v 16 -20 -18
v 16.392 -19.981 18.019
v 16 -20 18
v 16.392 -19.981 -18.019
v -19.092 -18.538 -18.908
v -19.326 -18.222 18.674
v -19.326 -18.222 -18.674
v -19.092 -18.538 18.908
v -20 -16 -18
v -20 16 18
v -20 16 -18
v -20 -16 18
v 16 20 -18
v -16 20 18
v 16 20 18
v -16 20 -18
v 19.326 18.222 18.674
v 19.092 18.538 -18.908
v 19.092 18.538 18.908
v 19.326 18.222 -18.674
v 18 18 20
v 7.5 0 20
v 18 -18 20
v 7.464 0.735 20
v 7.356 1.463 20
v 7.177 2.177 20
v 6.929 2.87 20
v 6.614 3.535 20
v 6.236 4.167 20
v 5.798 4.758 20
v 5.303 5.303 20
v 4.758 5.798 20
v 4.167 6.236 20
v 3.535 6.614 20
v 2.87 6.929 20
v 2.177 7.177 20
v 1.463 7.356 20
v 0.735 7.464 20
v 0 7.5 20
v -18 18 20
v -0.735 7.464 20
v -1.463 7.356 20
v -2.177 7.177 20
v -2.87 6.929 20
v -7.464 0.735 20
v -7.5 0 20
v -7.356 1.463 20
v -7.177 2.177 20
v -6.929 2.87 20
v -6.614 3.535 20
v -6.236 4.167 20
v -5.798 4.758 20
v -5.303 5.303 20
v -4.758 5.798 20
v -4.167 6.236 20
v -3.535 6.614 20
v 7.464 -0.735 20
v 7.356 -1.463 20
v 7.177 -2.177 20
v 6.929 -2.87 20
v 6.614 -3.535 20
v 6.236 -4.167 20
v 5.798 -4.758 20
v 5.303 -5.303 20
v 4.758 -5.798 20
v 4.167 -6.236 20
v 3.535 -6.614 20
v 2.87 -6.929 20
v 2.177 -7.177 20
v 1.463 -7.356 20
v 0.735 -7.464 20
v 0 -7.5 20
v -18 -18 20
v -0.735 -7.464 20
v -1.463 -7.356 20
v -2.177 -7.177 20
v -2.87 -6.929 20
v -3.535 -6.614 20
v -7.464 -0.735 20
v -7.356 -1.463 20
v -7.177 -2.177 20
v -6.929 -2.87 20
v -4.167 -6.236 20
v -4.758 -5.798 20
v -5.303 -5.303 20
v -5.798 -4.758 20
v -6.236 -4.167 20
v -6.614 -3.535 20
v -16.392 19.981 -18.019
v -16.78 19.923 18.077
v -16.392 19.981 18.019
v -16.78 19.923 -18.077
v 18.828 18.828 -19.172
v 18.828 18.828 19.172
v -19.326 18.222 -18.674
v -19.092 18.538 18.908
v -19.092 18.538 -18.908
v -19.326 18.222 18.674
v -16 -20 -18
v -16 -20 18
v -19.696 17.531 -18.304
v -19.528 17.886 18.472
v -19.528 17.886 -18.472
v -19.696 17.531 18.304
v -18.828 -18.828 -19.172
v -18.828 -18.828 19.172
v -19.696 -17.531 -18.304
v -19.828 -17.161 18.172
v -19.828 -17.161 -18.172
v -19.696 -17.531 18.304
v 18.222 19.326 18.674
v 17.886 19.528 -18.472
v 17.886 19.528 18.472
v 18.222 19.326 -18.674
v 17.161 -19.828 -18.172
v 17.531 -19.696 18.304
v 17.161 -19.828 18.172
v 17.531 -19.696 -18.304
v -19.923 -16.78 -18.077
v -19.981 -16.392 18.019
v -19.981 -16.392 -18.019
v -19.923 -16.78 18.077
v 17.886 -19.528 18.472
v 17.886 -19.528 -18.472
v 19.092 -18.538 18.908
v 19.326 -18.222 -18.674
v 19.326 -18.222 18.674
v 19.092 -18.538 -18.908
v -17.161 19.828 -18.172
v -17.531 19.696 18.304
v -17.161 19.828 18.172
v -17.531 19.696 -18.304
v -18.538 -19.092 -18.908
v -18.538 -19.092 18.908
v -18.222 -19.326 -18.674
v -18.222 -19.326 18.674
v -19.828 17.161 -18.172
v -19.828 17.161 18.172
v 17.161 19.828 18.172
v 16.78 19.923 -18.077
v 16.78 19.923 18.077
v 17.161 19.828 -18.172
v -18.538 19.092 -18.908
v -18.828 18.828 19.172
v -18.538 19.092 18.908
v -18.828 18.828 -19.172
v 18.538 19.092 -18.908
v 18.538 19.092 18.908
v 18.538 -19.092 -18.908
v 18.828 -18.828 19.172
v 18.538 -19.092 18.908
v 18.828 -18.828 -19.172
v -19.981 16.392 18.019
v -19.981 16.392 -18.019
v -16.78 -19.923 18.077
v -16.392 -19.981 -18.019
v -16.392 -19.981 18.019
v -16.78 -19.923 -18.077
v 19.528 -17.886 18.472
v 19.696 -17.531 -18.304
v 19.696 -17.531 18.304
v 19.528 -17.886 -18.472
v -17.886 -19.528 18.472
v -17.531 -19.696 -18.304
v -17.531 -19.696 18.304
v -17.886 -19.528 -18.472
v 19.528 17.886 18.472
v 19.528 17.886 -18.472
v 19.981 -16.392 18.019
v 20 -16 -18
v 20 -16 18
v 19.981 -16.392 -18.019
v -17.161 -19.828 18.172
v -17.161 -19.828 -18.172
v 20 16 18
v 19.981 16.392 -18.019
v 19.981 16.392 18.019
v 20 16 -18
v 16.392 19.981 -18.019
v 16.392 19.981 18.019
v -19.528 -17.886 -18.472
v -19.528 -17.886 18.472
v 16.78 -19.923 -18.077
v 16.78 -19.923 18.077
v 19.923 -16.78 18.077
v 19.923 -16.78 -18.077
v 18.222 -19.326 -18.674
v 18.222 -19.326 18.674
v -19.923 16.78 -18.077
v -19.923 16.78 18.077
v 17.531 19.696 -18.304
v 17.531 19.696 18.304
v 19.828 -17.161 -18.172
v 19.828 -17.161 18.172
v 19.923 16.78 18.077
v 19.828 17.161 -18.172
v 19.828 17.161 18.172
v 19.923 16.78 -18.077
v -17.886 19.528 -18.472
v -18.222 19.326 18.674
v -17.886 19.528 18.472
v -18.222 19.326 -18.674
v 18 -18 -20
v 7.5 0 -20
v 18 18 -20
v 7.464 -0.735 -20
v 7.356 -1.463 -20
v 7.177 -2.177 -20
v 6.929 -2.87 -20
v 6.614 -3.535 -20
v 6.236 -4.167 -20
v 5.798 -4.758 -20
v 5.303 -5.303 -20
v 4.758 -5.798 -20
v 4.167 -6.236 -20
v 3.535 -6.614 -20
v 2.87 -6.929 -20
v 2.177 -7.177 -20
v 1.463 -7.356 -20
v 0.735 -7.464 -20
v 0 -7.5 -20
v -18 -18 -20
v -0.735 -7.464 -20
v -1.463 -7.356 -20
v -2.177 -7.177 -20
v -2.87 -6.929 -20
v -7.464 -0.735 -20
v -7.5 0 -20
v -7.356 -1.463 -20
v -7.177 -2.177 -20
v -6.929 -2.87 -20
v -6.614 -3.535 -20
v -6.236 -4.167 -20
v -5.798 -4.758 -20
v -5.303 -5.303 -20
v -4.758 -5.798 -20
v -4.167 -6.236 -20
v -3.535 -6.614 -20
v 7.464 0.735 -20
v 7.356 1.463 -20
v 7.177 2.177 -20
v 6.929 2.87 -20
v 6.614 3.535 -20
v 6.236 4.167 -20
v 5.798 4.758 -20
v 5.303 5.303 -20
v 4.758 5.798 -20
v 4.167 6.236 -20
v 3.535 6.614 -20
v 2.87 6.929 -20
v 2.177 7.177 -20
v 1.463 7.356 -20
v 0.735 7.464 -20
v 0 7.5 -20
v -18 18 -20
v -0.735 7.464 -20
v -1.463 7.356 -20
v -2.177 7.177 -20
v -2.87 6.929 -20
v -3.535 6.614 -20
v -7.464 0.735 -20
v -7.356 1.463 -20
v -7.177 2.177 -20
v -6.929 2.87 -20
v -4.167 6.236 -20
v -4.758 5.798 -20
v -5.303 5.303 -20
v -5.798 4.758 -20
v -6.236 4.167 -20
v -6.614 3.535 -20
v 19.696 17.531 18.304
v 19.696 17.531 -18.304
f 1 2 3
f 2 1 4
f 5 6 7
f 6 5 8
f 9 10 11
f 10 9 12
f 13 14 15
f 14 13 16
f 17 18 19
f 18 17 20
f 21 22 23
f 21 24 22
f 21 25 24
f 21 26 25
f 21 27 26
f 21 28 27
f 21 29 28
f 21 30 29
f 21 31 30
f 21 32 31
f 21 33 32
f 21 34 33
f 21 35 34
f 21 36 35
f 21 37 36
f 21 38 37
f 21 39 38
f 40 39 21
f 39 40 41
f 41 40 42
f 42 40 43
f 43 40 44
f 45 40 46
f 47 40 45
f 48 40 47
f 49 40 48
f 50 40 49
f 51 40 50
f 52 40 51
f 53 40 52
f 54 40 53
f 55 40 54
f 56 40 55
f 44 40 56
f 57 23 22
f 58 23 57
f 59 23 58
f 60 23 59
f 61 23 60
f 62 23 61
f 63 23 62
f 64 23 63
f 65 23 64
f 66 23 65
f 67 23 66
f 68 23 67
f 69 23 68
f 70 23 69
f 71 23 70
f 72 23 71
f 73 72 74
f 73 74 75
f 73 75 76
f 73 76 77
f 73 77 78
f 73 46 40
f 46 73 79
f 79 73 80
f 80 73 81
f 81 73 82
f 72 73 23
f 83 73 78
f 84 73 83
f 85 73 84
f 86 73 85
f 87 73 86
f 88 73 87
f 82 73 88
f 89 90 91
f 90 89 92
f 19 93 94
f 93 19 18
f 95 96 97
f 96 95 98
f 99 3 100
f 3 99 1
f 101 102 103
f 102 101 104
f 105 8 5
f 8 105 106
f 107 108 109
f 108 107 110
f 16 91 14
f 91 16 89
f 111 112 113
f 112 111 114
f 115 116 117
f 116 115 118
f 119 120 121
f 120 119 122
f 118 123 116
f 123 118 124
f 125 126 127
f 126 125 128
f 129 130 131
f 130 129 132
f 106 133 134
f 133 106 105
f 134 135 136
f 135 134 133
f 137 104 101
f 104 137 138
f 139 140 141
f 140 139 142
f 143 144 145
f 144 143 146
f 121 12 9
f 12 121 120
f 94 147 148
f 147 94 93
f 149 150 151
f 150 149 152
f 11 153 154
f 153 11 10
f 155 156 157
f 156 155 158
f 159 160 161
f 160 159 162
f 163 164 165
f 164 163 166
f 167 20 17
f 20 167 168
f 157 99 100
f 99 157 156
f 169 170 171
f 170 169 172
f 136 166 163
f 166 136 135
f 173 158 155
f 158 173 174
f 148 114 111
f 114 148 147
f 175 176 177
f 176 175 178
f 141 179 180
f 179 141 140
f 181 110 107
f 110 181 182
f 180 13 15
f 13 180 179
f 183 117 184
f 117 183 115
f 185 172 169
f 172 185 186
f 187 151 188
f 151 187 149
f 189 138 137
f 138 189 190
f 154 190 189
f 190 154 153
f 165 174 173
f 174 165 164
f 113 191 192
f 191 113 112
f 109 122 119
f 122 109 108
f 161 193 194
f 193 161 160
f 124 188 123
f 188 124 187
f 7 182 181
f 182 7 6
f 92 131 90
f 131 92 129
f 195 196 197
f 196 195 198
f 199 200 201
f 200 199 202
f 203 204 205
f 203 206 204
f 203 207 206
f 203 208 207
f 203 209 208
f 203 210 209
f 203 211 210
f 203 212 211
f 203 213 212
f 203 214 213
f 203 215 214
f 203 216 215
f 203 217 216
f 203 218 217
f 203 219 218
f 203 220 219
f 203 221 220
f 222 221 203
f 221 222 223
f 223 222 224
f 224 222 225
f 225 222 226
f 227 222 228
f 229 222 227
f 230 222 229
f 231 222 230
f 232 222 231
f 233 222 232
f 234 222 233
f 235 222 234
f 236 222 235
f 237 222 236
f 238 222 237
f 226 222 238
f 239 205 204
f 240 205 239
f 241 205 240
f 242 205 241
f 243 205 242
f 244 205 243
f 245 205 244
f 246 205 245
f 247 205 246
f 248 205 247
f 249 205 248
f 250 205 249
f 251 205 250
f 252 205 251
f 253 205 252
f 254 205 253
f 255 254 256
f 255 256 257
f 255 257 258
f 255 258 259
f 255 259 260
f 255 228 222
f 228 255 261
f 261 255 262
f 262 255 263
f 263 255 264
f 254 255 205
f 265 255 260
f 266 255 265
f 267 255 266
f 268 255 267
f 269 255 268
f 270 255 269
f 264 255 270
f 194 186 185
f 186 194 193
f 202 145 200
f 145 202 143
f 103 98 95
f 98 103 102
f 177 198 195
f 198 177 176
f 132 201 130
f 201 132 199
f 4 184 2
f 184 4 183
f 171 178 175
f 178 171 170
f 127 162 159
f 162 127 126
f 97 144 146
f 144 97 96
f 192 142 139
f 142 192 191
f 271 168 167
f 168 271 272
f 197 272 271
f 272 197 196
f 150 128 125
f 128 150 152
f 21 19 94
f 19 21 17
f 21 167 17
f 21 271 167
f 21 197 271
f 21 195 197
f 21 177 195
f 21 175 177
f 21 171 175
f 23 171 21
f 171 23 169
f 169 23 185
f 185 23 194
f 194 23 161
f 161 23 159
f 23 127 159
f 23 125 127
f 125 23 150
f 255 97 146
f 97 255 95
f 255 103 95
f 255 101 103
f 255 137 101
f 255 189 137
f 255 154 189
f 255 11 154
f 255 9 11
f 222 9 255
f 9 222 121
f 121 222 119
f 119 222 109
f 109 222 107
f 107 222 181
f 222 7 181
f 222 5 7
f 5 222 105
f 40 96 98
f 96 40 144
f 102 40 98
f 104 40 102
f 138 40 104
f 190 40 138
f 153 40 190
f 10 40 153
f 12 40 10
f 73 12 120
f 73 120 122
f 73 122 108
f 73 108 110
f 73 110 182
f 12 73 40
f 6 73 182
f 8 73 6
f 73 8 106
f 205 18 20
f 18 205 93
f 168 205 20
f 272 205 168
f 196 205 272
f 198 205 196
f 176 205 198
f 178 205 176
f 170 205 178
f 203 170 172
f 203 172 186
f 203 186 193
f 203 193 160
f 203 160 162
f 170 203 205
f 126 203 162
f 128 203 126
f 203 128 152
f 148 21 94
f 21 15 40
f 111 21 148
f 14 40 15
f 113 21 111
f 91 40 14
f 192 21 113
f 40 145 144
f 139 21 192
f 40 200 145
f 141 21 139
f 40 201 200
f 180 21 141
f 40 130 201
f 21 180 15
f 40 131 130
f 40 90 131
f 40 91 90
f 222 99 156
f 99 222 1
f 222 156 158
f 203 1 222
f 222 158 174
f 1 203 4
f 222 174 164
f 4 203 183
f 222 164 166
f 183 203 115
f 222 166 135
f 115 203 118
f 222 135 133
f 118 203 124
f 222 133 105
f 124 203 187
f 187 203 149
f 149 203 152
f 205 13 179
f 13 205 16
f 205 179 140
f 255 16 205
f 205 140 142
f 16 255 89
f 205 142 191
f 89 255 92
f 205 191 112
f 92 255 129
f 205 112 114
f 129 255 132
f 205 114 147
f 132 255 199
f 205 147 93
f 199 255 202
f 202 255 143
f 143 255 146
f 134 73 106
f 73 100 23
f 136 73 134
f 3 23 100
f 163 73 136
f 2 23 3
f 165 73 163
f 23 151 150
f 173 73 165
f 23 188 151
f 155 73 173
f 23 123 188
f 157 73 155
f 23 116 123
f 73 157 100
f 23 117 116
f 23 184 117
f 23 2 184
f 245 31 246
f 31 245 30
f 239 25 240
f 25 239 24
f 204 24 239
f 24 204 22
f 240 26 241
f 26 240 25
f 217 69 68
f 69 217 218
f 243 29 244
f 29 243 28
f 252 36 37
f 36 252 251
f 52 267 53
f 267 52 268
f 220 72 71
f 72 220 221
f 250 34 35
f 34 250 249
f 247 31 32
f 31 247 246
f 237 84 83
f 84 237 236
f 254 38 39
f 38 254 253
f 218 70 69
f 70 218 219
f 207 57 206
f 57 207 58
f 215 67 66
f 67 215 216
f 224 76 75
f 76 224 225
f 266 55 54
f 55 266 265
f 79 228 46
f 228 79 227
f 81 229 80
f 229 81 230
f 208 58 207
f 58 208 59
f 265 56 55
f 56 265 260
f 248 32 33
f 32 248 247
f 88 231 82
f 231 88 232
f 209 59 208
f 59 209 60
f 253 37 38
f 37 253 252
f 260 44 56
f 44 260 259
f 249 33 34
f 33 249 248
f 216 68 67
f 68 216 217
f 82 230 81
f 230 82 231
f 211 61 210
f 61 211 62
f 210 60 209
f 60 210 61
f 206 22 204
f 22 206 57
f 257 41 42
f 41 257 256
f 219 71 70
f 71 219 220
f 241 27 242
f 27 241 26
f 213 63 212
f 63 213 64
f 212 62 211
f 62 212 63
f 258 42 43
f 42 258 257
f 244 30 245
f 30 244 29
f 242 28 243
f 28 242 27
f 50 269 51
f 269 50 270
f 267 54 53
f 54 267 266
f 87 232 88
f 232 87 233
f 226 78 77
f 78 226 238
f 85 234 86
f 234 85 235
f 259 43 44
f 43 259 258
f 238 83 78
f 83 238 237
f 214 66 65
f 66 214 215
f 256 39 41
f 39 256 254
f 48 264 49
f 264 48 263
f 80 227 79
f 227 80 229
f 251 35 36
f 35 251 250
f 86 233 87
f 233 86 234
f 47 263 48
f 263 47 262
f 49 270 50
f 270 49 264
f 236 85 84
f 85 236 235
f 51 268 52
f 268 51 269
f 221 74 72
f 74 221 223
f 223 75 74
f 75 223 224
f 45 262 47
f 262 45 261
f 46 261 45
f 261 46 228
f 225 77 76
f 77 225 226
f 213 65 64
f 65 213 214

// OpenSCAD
/* =================================================================
   test_cube.scad  —  simple test model for render skill validation
   =================================================================
   Units : mm
   Coords: X = width, Y = depth/height, Z = print direction
   ================================================================= */

// ── Parameters ────────────────────────────────────────────────────
size       = 40;    // outer cube side length (mm)
hole_d     = 15;    // through-hole diameter (mm)
fillet_r   = 4;     // corner rounding radius (mm)
chamfer_s  = 2;     // top/bottom chamfer size (mm)

// ── Resolution ────────────────────────────────────────────────────
$fn = 64;

// ── Derived values ────────────────────────────────────────────────
hole_r = hole_d / 2;

// ── Modules ───────────────────────────────────────────────────────
module rounded_box(s, r, ch) {
    intersection() {
        linear_extrude(s, center = true)
            offset(r = r)
                square([s - 2*r, s - 2*r], center = true);
        hull() {
            cube([s,        s,        s - 2*ch], center = true);
            cube([s - 2*ch, s - 2*ch, s       ], center = true);
        }
    }
}

// ── Assembly ──────────────────────────────────────────────────────
difference() {
    rounded_box(size, fillet_r, chamfer_s);
    cylinder(h = size + 1, r = hole_r, center = true);
}
